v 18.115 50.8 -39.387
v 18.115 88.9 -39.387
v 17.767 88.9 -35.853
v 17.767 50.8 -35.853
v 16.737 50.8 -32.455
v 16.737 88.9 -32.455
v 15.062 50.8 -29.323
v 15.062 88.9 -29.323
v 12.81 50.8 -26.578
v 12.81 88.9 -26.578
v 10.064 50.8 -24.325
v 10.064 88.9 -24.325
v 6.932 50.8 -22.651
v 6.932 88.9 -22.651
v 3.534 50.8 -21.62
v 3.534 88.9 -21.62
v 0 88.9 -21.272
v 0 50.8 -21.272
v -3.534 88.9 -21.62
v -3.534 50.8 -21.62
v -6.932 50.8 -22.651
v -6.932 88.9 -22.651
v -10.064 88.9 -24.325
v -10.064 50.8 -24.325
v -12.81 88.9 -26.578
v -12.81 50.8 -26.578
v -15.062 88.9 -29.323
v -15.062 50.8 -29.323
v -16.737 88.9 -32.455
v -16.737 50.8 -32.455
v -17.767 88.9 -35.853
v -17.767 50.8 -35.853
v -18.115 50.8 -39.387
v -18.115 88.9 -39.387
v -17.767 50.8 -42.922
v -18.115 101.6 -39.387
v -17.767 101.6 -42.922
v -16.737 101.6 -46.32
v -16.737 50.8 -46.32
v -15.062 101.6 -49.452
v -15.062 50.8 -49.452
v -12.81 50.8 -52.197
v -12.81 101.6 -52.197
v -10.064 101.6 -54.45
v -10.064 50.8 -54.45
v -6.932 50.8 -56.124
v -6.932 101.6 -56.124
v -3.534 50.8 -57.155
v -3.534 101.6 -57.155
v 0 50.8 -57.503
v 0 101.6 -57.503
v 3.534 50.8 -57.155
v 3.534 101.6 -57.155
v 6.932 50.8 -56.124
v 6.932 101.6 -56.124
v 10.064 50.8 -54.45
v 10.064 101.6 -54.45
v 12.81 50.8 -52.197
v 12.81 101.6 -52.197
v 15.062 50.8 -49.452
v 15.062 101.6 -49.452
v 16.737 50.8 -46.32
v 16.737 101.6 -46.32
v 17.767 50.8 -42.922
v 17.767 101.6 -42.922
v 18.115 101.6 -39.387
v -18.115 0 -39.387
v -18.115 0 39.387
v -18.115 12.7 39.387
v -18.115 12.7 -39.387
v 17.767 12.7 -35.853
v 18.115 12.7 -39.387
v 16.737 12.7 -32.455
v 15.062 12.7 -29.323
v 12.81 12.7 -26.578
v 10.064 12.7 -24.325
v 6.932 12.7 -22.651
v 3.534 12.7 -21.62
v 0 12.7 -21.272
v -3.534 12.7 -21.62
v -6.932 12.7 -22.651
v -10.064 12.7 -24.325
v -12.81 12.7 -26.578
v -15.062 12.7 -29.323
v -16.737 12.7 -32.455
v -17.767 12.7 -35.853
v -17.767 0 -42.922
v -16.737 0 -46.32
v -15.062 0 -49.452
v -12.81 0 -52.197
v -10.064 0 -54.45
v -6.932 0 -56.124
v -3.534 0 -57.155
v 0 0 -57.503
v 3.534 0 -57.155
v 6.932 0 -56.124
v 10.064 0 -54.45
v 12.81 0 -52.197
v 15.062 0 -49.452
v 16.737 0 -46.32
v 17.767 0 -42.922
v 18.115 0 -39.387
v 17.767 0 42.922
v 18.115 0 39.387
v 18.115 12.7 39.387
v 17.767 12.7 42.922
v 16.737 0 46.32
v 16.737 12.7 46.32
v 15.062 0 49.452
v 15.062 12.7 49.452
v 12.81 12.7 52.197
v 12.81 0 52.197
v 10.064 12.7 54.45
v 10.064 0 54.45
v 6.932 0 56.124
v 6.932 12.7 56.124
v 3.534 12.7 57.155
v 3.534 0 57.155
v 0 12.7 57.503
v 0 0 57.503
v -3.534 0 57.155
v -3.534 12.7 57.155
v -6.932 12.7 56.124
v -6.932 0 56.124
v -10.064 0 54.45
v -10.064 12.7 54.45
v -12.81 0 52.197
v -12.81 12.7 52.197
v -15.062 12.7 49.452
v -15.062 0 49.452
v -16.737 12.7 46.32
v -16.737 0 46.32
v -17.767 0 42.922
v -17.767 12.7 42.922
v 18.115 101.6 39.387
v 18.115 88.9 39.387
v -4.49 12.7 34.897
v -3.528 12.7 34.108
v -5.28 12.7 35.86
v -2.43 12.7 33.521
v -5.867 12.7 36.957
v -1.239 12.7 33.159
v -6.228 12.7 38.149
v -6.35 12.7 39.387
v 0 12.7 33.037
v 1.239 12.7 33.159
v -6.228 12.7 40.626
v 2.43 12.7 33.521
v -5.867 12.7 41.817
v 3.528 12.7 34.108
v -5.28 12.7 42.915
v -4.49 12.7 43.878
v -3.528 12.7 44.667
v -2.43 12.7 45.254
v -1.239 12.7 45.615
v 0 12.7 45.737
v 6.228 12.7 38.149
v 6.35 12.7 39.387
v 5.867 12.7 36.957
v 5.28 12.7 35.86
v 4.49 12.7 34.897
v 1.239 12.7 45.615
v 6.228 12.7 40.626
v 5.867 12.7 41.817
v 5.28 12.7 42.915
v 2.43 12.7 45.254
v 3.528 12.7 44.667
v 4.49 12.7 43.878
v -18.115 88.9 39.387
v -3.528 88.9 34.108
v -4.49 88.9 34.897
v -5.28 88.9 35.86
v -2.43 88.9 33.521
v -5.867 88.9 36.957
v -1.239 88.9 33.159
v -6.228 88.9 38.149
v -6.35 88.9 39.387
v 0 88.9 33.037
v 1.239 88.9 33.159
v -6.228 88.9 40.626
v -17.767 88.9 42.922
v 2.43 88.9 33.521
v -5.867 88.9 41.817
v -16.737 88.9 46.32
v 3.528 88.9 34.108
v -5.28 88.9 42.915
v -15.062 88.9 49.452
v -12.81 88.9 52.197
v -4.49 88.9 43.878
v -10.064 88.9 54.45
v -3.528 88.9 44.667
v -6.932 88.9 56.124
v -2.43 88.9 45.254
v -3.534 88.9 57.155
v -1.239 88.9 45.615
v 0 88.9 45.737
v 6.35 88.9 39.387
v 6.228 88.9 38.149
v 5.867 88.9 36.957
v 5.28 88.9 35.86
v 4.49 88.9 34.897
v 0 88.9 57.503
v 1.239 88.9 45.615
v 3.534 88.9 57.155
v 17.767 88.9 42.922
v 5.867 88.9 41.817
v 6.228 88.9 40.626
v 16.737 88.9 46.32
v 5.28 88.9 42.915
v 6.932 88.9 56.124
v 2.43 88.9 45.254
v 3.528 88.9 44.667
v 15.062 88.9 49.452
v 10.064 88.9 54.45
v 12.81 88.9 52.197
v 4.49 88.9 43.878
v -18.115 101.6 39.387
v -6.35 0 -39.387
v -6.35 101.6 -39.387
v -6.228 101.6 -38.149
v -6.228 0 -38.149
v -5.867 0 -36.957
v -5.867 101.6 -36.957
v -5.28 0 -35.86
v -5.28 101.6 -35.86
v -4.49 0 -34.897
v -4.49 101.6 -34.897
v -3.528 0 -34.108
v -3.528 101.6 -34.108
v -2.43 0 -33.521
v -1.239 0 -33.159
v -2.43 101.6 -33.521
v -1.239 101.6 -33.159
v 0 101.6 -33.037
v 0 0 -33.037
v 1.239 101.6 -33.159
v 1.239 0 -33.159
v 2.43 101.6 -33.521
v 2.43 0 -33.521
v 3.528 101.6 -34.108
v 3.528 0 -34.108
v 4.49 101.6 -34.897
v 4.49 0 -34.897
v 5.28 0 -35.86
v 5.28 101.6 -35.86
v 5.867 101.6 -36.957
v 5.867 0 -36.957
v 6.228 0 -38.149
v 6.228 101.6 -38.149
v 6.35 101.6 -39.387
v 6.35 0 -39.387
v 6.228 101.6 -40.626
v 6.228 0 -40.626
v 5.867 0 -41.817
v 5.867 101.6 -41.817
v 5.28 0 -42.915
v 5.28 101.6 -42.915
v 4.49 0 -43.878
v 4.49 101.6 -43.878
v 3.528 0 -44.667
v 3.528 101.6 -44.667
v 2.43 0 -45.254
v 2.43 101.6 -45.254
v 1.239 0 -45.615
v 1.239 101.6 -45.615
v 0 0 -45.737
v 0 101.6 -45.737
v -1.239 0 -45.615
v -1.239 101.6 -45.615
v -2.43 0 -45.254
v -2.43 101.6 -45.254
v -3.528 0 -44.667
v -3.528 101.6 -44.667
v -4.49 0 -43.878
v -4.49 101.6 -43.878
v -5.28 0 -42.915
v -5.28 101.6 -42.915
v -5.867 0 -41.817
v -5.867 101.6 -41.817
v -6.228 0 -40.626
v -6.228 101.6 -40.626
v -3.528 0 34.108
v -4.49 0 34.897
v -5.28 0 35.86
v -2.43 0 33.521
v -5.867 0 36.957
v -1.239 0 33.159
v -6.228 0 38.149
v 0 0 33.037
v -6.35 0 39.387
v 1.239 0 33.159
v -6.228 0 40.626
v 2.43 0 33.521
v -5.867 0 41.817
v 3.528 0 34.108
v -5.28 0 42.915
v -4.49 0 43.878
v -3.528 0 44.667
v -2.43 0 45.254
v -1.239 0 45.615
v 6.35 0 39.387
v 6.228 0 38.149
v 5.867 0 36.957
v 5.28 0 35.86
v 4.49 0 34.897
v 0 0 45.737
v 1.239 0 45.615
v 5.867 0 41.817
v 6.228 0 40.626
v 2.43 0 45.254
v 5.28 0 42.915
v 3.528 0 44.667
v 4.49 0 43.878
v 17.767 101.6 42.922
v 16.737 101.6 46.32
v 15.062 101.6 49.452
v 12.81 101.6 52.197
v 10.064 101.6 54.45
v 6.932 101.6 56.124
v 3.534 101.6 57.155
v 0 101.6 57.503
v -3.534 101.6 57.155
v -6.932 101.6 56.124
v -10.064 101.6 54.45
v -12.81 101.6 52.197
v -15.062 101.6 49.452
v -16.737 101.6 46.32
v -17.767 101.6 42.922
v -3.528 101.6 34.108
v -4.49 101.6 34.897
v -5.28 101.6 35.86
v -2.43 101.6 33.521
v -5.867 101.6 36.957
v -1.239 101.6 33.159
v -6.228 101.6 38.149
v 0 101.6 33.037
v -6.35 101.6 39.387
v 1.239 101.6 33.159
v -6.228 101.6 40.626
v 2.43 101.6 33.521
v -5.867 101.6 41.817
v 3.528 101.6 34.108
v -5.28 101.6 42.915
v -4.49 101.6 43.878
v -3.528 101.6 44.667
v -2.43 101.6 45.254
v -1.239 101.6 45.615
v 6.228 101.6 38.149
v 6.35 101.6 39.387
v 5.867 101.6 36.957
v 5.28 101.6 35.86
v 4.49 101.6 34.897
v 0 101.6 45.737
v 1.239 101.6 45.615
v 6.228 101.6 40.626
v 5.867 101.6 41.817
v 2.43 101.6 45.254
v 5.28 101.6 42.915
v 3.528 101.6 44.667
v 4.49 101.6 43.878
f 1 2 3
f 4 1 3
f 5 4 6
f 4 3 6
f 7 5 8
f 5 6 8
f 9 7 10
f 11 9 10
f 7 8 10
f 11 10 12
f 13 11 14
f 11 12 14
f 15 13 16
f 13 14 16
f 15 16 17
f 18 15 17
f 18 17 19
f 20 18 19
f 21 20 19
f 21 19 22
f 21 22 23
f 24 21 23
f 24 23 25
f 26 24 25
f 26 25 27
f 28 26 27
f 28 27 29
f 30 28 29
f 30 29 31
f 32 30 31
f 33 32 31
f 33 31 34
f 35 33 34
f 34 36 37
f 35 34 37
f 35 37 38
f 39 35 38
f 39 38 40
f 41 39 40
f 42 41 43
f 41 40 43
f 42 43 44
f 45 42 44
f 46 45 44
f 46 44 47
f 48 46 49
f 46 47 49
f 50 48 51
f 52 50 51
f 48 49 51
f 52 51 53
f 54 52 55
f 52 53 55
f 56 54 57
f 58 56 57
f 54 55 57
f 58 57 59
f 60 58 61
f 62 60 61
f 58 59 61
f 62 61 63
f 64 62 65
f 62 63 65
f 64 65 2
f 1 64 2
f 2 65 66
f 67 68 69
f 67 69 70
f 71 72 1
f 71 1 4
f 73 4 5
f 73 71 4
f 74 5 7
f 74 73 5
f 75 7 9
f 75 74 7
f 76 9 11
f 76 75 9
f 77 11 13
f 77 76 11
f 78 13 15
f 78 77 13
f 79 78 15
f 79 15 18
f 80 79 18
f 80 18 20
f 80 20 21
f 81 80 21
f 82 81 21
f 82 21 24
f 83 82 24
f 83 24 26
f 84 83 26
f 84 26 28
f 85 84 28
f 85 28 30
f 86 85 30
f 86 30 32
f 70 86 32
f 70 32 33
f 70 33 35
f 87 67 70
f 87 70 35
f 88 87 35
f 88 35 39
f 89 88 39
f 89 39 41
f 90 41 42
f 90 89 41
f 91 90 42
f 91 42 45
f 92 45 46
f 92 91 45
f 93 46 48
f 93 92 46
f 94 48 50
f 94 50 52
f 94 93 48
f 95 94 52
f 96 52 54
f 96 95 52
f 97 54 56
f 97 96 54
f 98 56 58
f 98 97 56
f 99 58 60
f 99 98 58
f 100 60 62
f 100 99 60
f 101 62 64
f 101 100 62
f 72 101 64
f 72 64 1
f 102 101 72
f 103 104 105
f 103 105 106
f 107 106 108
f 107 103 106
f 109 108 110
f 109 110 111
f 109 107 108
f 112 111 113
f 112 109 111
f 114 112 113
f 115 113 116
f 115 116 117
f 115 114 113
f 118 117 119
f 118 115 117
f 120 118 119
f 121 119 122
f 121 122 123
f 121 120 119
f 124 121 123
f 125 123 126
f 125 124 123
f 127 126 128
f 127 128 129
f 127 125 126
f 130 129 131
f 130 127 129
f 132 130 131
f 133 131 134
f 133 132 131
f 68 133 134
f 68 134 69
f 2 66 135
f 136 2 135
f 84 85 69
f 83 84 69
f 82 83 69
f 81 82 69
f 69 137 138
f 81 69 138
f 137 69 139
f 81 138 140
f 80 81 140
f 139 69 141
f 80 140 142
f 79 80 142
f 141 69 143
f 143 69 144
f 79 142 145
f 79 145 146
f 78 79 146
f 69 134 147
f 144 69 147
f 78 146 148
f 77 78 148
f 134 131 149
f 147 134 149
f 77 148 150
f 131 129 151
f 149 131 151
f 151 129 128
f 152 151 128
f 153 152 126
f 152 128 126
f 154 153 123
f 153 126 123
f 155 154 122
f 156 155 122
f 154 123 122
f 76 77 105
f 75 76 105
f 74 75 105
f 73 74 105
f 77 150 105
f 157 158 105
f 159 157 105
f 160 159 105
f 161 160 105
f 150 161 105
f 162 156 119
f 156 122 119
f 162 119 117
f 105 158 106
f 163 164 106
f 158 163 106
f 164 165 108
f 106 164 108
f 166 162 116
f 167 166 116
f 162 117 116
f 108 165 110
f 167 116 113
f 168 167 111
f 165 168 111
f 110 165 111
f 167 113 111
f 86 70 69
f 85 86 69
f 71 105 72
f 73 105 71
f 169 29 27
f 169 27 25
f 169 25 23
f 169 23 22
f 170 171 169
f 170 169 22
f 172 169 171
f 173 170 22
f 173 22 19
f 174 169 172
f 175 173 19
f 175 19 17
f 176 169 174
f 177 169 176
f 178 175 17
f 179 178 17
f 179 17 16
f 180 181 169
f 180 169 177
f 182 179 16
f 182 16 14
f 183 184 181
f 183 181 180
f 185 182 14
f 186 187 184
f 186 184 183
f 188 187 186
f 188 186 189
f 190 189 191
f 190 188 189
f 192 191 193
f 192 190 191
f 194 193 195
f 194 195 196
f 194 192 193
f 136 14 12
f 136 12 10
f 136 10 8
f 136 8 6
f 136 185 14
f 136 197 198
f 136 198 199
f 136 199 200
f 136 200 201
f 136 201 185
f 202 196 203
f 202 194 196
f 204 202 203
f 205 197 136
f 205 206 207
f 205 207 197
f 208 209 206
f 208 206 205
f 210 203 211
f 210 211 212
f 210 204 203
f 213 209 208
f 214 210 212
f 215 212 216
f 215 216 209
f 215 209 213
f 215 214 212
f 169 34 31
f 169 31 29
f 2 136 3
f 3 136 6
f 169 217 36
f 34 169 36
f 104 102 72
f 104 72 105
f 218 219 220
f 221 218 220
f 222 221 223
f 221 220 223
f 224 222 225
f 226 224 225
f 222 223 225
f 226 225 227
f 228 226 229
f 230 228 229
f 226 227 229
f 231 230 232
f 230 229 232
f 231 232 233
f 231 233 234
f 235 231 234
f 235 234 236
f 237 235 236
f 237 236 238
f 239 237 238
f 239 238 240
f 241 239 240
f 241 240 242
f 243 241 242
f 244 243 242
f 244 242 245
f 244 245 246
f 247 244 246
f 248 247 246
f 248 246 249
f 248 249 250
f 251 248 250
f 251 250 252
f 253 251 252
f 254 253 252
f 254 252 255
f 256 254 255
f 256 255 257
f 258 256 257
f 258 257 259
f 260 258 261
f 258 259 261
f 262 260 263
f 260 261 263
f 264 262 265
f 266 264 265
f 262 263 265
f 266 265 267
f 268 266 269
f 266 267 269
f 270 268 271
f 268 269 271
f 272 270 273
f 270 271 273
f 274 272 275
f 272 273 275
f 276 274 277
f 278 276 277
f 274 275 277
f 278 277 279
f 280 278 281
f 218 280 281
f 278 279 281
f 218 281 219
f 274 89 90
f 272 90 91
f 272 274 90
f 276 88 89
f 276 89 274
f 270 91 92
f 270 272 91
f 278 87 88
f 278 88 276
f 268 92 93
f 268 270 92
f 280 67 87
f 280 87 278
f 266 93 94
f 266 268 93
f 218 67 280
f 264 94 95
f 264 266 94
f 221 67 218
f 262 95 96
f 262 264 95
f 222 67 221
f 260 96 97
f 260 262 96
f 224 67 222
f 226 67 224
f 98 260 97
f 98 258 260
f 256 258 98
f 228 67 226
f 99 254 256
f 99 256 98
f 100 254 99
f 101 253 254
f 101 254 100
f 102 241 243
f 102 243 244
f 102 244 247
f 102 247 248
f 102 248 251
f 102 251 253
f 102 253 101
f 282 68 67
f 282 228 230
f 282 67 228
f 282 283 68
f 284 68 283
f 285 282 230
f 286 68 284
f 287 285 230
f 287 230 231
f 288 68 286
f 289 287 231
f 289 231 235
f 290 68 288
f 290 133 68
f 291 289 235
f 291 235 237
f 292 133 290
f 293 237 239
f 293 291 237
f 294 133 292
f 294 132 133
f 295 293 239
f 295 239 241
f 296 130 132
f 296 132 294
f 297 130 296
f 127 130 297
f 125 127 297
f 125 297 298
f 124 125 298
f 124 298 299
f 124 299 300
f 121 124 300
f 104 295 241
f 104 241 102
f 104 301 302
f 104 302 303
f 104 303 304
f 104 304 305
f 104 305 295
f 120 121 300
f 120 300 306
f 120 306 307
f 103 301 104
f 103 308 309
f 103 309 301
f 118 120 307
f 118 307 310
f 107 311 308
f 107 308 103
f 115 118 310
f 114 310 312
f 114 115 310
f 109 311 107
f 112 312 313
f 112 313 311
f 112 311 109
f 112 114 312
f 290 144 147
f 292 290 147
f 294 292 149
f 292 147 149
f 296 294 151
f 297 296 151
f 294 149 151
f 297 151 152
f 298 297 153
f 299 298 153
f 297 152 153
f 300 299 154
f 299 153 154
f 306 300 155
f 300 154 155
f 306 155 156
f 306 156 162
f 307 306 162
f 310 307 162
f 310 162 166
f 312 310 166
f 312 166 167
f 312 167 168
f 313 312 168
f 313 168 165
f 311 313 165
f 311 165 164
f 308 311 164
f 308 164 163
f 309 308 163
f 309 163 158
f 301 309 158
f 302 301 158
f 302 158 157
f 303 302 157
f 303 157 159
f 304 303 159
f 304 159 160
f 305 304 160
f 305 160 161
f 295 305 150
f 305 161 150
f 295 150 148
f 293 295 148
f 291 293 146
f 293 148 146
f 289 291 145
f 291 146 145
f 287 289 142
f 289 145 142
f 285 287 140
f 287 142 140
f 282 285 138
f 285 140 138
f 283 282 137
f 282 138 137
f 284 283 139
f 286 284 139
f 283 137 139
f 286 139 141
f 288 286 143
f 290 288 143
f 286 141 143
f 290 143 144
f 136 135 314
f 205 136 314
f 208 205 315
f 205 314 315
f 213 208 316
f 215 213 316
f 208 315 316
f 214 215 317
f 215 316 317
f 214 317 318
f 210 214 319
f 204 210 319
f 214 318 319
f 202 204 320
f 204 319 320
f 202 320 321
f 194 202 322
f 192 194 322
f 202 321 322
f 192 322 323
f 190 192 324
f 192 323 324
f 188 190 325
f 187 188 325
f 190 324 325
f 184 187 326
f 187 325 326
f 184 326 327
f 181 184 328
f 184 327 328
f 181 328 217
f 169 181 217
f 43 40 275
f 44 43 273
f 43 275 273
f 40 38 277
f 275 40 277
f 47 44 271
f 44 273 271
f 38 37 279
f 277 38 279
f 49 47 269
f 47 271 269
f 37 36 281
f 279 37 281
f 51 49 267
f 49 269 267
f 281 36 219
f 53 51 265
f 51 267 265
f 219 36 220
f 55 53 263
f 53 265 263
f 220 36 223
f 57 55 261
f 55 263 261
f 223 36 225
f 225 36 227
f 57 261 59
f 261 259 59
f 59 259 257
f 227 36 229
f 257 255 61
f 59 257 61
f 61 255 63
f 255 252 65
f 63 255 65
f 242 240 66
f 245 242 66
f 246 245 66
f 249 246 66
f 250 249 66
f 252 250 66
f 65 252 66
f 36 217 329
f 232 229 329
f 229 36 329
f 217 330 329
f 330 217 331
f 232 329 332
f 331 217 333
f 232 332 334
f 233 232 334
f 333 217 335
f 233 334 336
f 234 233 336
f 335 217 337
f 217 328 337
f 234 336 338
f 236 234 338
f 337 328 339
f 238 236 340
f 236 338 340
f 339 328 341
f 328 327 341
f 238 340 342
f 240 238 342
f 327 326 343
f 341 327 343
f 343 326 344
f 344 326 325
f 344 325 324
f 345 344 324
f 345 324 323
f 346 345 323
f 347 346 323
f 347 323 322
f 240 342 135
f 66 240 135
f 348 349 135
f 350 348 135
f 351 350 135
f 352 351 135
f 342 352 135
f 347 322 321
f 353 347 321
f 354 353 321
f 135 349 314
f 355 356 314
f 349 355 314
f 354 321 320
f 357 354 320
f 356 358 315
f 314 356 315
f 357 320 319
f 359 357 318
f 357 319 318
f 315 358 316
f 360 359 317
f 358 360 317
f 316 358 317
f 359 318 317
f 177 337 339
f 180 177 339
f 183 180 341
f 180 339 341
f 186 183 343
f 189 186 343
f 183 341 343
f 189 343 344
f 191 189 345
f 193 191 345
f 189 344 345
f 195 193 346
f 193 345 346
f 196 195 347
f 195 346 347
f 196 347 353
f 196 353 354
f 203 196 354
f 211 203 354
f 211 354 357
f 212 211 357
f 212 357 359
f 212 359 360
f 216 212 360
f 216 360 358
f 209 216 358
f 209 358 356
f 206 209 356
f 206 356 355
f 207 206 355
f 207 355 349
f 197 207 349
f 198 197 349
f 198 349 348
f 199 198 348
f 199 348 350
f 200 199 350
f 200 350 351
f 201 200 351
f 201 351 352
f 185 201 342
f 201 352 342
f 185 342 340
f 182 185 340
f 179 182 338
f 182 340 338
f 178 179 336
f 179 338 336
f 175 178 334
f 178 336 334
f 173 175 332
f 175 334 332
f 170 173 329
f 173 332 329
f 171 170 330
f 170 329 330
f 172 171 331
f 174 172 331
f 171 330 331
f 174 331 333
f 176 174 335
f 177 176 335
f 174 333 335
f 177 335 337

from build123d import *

# Parameters (mm, degrees)
F1_DEPTH = 12.7
F3_DEPTH = 50.8
F7_D     = 12.7


with BuildPart() as f1:
    # F0 (on Front) → F1 (new body)
    with BuildSketch(Plane.XZ):
        with BuildLine():
            ThreePointArc((18.115472, 39.387427), (0, 57.502899), (-18.115472, 39.387427))
            Line((-18.115472, 39.387427), (-18.115472, -39.387427))
            ThreePointArc((-18.115472, -39.387427), (0, -21.271955), (18.115472, -39.387427))
            Line((18.115472, -39.387427), (18.115472, 39.387427))
        make_face()
    extrude(amount=-F1_DEPTH)

    # F2 (on face) → F3 (join)
    with BuildSketch(Plane.XZ):
        with BuildLine():
            ThreePointArc((-18.115472, -39.387427), (0, -57.502899), (18.115472, -39.387427))
            ThreePointArc((18.115472, -39.387427), (0, -21.271955), (-18.115472, -39.387427))
        make_face()
    extrude(amount=-F3_DEPTH)

    # F5: F1 across plane


with BuildPart() as f1_1:
    add(f1.part)
    add(f1.part.mirror(Plane.XZ.offset(-50.8)))

    # F7 (through all)
    with Locations(Plane.XZ):
        with Locations((0, -39.387427), (0, 39.387427)):
            Hole(F7_D / 2)


solid = f1_1.part
